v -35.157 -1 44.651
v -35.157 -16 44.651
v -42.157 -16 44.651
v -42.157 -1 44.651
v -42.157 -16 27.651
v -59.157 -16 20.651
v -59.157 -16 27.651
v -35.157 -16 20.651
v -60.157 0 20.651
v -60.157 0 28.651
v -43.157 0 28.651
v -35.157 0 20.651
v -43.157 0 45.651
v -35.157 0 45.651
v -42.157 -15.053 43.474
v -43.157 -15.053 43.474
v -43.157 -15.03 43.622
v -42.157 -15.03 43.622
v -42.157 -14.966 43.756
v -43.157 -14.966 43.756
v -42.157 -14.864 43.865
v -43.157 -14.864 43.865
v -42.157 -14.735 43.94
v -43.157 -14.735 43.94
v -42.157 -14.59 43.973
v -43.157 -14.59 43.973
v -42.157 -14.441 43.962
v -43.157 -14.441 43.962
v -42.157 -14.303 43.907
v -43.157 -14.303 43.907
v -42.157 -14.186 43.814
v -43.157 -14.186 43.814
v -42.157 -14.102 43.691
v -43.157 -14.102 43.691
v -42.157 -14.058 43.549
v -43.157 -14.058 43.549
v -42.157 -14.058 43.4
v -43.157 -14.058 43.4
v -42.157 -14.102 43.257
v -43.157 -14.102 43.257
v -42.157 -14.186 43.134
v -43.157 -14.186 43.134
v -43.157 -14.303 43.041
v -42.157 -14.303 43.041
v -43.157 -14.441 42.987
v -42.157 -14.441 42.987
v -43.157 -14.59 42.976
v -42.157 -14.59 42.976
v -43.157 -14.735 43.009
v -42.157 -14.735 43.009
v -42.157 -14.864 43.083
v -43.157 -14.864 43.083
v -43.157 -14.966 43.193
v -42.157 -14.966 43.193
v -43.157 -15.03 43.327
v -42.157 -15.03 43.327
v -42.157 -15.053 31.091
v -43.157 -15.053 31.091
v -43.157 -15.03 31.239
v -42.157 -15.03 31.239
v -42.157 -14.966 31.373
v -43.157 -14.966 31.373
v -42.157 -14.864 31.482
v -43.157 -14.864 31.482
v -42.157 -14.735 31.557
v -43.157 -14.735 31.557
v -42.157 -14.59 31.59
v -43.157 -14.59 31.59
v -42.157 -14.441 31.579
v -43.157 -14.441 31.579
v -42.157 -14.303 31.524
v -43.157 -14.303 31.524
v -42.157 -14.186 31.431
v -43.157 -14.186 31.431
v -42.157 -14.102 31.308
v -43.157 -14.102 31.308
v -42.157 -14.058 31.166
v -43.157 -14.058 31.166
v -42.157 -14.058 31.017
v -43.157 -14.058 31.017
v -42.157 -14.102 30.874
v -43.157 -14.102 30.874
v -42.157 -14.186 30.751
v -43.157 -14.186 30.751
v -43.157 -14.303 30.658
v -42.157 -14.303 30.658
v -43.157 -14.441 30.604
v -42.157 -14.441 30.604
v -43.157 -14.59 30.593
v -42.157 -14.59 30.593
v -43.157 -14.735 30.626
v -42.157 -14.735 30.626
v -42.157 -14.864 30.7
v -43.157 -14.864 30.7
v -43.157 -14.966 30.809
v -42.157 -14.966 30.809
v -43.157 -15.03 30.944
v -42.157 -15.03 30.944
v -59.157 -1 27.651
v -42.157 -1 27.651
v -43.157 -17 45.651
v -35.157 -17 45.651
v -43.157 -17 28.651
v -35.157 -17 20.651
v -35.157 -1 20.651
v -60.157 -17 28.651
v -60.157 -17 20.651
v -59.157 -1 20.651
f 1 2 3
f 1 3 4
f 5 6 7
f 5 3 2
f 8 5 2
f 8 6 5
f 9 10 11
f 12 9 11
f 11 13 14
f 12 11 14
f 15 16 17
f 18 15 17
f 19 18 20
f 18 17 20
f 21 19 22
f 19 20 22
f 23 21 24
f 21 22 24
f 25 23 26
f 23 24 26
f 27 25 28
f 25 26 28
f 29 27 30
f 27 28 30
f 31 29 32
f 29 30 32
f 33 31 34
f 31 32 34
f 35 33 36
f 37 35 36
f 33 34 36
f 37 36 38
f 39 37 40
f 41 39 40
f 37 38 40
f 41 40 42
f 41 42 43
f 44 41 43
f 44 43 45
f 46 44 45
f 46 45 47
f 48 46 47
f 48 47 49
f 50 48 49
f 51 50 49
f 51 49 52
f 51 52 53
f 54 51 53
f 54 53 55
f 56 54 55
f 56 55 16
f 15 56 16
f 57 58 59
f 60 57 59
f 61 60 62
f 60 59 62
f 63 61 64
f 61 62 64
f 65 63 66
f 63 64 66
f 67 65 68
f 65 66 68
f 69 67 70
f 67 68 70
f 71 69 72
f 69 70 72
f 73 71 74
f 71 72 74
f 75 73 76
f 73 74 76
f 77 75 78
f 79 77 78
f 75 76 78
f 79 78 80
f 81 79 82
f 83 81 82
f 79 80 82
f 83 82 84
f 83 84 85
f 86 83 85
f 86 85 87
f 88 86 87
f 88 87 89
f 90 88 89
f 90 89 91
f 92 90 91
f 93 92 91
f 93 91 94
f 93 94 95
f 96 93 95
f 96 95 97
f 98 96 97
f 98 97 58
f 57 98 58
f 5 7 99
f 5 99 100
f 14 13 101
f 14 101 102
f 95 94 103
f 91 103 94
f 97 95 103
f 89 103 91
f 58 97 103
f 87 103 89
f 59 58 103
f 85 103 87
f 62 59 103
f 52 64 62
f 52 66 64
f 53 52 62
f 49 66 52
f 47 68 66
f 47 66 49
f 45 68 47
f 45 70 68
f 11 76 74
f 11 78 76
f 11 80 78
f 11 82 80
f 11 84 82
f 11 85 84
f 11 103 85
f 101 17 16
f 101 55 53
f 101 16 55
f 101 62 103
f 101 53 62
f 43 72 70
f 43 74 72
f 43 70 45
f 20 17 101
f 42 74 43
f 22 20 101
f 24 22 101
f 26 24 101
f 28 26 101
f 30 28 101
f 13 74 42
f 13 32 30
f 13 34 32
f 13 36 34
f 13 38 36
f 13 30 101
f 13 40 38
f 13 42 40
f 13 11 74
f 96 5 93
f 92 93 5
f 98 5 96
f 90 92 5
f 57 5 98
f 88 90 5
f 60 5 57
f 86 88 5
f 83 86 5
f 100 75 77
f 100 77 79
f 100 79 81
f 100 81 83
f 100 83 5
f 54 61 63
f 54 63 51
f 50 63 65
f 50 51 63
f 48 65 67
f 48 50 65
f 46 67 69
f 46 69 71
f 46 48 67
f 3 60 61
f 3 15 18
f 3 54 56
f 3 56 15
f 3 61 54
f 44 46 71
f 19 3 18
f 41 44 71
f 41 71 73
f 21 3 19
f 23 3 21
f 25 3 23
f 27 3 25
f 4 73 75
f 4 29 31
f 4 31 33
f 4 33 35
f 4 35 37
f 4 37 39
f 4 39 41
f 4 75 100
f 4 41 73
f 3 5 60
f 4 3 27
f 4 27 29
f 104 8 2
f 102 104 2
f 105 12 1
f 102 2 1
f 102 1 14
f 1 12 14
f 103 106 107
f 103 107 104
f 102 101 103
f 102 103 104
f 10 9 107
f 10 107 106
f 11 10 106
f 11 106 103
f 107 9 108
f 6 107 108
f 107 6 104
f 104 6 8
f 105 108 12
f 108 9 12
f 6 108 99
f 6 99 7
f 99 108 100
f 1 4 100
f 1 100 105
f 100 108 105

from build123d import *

# Parameters (mm, degrees)
F0_W     = 17
F0_H     = 8
F0_W_2   = 8
F0_H_2   = 17
F1_DEPTH = 17
F2_W     = 24
F2_H     = 15
F3_DEPTH = 7
F4_W     = 15
F4_H     = 17
F5_DEPTH = 7
F7_D     = 1


with BuildPart() as f1:
    # F0 (on Front) → F1 (new body)
    with BuildSketch(Plane.XZ):
        with Locations((-51.656717, 24.650854)):
            Rectangle(F0_W, F0_H)
        with Locations((-39.156717, 37.150854)):
            Rectangle(F0_W_2, F0_H_2)
        with Locations((-39.156717, 24.650854)):
            Rectangle(F0_W_2, F0_H)
    extrude(amount=F1_DEPTH)

    # F2 (on face) → F3 (cut)
    with BuildSketch(Plane(origin=(0, 0, 20.650854), x_dir=(1, 0, 0), z_dir=(0, 0, -1))):
        with Locations((-47.156717, 8.5)):
            Rectangle(F2_W, F2_H)
    extrude(amount=-F3_DEPTH, mode=Mode.SUBTRACT)

    # F4 (on face) → F5 (cut)
    with BuildSketch(Plane.YZ.offset(-35.156717)):
        with Locations((-8.5, 36.150854)):
            Rectangle(F4_W, F4_H)
    extrude(amount=-F5_DEPTH, mode=Mode.SUBTRACT)

    # F7 (through all)
    with Locations(Plane.YZ.offset(-42.156717)):
        with Locations((-14.552529, 31.091157), (-14.552529, 43.474194)):
            Hole(F7_D / 2)


solid = f1.part
